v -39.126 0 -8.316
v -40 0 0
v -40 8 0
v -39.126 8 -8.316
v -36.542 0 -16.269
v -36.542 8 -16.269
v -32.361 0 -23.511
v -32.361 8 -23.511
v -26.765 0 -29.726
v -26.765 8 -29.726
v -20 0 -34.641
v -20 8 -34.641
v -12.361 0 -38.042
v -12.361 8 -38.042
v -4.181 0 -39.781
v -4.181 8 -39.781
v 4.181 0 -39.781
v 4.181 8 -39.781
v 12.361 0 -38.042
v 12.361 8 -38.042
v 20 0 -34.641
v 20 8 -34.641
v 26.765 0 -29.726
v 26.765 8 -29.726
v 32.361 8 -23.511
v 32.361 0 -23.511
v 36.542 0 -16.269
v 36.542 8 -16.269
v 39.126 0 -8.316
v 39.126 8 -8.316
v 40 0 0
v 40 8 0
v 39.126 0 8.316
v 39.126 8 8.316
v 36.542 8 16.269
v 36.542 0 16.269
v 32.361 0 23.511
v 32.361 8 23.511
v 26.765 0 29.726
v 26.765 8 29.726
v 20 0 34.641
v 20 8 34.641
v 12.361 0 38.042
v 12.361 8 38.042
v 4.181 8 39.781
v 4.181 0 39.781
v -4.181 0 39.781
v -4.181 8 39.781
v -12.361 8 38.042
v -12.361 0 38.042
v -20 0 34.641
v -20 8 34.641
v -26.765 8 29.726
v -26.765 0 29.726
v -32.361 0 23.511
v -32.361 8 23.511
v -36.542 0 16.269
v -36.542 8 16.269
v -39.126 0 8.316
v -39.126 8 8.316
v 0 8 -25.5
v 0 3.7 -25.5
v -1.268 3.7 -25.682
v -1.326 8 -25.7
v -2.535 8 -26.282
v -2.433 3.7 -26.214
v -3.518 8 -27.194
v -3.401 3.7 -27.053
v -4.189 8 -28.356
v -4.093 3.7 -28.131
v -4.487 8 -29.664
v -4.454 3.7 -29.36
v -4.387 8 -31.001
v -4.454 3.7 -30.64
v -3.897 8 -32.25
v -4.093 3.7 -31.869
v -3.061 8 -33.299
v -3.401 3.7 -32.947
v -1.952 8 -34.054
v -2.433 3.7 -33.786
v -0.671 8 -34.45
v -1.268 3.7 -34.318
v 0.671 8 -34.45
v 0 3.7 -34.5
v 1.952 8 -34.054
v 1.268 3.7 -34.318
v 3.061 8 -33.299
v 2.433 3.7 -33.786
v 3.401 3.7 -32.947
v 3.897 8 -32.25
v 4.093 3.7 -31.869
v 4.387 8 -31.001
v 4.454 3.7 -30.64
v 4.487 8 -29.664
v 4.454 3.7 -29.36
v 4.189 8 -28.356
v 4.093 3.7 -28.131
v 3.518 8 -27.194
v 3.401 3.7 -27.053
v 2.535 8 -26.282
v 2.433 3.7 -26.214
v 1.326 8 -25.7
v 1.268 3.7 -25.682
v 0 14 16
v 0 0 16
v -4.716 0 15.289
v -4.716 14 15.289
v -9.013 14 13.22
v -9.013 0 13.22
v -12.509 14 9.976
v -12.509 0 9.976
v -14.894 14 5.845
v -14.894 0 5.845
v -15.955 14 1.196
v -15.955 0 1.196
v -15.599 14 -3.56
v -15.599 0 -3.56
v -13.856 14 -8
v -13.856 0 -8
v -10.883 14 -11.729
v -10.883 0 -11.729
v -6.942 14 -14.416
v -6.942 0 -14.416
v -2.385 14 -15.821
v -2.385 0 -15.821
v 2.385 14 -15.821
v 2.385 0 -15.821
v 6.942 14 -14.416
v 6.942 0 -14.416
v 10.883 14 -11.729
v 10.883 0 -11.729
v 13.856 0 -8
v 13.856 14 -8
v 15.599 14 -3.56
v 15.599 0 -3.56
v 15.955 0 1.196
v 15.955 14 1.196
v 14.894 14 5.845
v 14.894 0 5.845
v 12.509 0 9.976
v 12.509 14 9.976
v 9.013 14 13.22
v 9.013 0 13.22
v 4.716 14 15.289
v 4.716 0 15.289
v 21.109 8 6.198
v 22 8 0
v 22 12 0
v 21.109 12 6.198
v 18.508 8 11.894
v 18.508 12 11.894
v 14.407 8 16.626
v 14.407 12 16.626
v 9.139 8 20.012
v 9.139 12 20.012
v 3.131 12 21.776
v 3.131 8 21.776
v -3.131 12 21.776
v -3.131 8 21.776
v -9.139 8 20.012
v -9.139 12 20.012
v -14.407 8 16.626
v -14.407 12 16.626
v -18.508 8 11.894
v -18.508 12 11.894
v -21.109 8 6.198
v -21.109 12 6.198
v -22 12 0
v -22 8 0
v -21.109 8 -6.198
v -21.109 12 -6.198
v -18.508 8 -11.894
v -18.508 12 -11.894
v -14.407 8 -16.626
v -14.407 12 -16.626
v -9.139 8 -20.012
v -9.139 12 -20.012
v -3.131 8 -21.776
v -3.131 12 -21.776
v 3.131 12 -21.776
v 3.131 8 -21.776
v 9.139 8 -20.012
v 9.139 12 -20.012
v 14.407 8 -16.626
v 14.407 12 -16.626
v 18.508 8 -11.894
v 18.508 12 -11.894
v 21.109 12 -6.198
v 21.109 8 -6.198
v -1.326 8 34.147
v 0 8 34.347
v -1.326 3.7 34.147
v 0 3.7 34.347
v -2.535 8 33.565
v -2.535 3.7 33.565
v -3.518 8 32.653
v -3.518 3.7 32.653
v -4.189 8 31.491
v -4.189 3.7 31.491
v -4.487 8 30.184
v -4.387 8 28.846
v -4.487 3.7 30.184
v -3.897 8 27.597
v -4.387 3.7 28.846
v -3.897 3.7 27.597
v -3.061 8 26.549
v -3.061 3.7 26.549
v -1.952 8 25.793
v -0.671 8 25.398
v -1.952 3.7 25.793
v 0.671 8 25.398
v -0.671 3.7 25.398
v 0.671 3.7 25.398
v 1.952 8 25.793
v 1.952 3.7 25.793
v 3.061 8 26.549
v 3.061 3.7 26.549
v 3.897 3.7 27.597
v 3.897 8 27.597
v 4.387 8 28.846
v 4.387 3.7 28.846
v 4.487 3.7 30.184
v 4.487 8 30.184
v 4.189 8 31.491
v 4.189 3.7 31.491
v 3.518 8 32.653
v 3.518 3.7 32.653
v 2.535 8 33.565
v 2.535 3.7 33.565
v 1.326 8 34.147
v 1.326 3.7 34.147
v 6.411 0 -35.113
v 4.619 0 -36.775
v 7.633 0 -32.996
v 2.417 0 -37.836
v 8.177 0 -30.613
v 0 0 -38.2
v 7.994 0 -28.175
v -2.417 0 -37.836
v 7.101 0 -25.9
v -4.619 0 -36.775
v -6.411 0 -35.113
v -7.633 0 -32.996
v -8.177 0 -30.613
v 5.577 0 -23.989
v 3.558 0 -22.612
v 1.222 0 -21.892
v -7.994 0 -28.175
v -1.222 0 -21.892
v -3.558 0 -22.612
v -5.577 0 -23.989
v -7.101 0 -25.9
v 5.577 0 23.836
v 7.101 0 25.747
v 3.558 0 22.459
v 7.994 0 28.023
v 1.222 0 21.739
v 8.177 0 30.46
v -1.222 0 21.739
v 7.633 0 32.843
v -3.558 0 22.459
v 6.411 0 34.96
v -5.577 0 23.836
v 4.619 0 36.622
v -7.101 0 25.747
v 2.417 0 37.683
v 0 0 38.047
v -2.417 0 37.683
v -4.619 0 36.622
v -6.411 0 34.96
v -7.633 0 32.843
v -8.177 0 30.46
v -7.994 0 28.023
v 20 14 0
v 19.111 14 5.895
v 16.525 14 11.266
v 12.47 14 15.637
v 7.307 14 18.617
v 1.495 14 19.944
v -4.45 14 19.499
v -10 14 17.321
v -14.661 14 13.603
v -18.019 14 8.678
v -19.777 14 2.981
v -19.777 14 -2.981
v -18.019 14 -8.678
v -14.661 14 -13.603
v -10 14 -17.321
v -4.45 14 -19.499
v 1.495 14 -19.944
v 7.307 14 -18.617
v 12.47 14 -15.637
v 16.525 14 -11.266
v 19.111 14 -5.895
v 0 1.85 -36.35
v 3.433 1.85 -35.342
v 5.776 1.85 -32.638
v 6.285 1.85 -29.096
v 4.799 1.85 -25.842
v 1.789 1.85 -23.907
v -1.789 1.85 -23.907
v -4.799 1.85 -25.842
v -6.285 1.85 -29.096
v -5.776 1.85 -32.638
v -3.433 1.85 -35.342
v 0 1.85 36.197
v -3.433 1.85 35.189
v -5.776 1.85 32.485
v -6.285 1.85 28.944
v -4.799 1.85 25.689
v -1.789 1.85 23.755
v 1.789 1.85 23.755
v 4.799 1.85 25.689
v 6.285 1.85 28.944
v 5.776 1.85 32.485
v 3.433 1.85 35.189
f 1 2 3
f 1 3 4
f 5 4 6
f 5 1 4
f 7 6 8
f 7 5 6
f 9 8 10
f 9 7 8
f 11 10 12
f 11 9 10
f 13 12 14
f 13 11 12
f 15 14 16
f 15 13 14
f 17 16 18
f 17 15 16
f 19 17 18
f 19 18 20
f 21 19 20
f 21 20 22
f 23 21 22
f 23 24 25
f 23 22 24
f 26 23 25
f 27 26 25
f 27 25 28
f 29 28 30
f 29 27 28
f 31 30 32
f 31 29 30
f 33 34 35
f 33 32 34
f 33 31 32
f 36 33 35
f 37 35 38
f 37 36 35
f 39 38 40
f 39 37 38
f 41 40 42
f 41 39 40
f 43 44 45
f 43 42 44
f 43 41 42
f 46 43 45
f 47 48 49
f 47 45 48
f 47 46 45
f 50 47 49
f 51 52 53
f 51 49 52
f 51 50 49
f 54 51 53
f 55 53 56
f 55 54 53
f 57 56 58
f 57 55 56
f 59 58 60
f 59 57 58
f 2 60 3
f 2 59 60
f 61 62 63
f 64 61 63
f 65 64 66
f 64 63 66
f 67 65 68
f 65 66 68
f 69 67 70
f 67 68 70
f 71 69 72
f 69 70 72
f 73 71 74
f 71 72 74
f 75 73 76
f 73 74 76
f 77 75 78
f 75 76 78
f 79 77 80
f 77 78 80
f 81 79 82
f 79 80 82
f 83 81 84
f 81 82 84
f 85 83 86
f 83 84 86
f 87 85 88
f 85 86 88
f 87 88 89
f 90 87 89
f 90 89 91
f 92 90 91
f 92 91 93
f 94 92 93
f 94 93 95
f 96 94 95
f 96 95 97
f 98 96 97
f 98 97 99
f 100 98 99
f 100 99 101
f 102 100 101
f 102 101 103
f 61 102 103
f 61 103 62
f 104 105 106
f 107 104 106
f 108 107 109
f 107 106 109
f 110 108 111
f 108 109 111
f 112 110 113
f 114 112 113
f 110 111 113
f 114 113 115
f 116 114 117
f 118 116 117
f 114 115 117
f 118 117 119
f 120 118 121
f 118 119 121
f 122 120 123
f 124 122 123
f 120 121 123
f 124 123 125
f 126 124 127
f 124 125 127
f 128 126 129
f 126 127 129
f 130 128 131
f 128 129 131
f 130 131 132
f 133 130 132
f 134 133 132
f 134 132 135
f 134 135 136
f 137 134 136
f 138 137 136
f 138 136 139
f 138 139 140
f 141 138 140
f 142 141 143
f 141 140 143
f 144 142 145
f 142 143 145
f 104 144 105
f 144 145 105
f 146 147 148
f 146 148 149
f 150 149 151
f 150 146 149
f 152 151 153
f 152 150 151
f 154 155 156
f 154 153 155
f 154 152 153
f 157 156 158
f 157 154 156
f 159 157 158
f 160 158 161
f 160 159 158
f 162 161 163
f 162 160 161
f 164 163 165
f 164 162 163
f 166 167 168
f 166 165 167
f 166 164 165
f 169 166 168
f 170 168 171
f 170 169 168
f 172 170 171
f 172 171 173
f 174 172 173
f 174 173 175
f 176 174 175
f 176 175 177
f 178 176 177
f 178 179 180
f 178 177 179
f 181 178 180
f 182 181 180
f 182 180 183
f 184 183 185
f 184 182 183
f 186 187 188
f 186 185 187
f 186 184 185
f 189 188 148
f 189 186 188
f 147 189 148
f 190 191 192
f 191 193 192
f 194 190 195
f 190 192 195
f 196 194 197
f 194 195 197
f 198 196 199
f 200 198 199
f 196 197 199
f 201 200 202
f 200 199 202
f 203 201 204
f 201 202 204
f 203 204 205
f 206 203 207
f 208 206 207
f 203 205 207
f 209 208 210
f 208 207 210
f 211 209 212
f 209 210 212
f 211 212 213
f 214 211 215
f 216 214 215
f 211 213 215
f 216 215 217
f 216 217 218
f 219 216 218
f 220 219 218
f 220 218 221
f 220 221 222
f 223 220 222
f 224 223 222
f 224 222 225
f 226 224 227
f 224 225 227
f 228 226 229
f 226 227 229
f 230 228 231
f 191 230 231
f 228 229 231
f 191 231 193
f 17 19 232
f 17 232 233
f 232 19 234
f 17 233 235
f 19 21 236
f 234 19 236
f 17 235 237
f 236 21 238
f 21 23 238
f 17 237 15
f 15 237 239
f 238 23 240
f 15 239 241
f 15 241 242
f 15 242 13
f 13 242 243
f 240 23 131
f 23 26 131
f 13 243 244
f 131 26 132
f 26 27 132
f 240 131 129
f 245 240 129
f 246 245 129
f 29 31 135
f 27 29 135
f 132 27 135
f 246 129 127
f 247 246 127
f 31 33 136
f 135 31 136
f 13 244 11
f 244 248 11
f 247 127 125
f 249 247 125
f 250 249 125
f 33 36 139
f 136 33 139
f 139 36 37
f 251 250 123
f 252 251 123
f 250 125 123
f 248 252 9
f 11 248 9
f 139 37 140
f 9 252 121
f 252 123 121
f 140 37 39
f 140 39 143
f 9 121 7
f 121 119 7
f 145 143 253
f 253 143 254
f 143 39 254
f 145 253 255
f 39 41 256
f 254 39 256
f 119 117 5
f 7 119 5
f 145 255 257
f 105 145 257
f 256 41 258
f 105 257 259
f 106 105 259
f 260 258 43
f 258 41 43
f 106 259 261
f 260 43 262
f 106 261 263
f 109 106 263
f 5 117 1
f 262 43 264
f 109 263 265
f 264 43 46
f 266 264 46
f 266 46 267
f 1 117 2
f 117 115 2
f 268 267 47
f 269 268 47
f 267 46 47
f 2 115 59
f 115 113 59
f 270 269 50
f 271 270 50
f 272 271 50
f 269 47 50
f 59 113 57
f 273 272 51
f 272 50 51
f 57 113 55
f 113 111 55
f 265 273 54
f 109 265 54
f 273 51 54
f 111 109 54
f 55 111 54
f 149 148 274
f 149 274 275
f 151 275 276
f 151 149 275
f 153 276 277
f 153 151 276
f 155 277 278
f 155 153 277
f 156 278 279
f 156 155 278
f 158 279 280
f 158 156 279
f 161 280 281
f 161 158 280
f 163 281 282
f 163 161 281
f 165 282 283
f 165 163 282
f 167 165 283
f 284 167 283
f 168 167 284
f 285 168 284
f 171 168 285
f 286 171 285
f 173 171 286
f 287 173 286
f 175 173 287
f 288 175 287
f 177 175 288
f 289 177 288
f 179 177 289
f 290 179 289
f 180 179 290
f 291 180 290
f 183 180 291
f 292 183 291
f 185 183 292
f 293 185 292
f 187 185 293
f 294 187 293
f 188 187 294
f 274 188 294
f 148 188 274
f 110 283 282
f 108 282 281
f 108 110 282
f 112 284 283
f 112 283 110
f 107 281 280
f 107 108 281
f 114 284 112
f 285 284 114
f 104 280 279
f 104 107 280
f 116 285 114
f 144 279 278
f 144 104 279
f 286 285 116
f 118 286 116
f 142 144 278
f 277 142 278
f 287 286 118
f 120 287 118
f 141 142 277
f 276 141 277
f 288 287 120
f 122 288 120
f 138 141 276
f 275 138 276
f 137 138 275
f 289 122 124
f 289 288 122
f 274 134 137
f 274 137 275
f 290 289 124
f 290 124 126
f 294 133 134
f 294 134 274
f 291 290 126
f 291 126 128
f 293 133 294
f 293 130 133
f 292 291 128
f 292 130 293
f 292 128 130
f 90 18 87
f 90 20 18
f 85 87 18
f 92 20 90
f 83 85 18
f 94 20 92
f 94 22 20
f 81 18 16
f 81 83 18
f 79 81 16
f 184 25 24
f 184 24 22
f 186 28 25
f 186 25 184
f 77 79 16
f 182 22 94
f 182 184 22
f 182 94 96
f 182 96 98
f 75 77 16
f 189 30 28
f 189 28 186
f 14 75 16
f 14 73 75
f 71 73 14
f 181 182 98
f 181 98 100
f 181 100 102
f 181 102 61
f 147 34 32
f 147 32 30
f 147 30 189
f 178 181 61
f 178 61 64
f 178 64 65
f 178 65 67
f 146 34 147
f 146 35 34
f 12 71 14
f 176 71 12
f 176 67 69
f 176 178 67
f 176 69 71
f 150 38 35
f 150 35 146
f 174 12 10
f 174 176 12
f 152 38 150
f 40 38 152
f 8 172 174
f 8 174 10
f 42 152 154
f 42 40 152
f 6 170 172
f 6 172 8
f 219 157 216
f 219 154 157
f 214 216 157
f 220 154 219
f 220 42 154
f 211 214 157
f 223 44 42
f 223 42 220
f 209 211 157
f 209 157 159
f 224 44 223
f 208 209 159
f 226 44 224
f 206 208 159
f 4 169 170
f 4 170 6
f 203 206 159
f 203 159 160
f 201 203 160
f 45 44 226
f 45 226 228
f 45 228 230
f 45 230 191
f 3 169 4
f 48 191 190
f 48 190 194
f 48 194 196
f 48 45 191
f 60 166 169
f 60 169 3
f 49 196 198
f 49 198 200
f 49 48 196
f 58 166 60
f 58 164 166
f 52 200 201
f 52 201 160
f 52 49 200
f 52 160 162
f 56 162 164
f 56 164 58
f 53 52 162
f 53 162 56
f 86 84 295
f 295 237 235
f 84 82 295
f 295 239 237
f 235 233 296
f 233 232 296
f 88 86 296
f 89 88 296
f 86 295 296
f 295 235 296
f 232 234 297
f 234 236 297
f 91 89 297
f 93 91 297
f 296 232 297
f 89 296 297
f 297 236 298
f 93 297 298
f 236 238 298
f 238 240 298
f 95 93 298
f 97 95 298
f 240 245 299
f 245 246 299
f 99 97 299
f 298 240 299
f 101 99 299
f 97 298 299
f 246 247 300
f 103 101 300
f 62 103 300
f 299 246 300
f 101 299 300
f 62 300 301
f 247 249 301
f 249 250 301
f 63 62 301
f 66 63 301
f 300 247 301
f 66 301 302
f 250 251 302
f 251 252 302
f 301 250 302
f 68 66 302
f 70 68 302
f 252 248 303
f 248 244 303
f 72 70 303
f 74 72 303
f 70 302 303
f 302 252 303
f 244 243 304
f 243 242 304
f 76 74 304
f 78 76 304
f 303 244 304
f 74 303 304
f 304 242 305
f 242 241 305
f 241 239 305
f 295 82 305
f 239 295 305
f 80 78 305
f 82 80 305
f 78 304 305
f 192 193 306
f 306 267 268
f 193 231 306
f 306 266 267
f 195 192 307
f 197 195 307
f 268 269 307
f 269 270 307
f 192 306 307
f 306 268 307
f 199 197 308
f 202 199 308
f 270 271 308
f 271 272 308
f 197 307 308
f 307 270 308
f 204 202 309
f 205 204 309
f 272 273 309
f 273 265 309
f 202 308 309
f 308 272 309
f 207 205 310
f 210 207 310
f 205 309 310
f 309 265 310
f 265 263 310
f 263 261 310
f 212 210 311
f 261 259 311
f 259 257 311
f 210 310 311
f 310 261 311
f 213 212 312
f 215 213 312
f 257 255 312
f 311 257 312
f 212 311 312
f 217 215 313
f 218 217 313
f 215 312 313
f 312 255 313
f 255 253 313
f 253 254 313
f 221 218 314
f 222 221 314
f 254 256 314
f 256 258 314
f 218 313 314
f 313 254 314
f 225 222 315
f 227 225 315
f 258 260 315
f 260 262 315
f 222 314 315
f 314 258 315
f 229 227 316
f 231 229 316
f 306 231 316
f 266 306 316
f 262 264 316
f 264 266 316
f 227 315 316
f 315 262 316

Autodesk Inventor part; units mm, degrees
ref_plane "YZ Plane" through (0, 0, 0) normal (1, 0, 0) x (0, 1, 0)
ref_plane "XZ Plane" through (0, 0, 0) normal (0, 1, 0) x (-1, 0, 0)
ref_plane "XY Plane" through (0, 0, 0) normal (0, 0, 1) x (1, 0, 0)
sketch "Эскиз1" plane through (0, 0, 0) normal (0, 1, 0) x (-1, 0, 0)
  point P0 (0, 0)
sketch "Эскиз2" plane through (0, 0, 0) normal (0, 1, 0) x (-1, 0, 0)
  circle A0 centre (0, 0) radius 40
  dimension "d0" = 80
extrude "Выдавливание1" add sketch "Эскиз2" along normal blind 8
sketch "Эскиз3" plane through (0, 0, 0) normal (0, -1, 0) x (1, 0, 0)
  circle A0 centre (0, 30) radius 8.2
  circle A1 centre (0, -30) radius 8.2
  point P0 (0, 0)
  dimension "d3" = 16.4
  dimension "d4" = 16.4
sketch "Эскиз4" plane through (0, 0, 0) normal (1, 0, 0) x (0, 1, 0)
  line L0 (0, 40) -> (0, -40) projected
  line L1 (0, 29.8473) -> (0, 38.0473)
  line L2 (0, 38.0473) -> (8.2, 29.8473)
  line L3 (8.2, 29.8473) -> (0, 29.8473)
  point P0 (0, 0)
  dimension "d5" = 8.2
  dimension "d6" = 45
revolve "Вращение1" cut sketch "Эскиз4" angle 360 about axis through (0, 8.2, 29.8473) along (0, -1, 0)
sketch "Эскиз5" plane through (0, 0, 0) normal (1, 0, 0) x (0, 1, 0)
  point P0 (0, 0)
sketch "Эскиз6" plane through (0, 0, 0) normal (1, 0, 0) x (0, 1, 0)
  line L0 (0, 40) -> (0, -40) projected
  line L1 (0, -30) -> (0, -38.2)
  line L2 (0, -38.2) -> (8.2, -30)
  line L3 (8.2, -30) -> (0, -30)
  point P0 (0, 0)
  dimension "d8" = 8.2
  dimension "d9" = 45
revolve "Вращение2" cut sketch "Эскиз6" angle 360 about axis through (0, 8.2, -30) along (0, -1, 0)
sketch "Эскиз7" plane through (0, 8, 0) normal (0, 1, 0) x (1, 0, 0)
  circle A0 centre (0, 30) radius 0.2 projected
  circle A1 centre (0, -29.8473) radius 0.2 projected
  point P0 (0, 0)
hole "Отверстие1" at (0, 8, -30) at (0, 8, 29.8473) direction (0, -1, 0) diameter 9 end through all
sketch "Эскиз8" plane through (0, 8, 0) normal (0, 1, 0) x (1, 0, 0)
  circle A0 centre (0, 0) radius 22
  dimension "d18" = 44
extrude "Выдавливание2" add sketch "Эскиз8" along normal blind 6
sketch "Эскиз9" plane through (0, 14, 0) normal (0, 1, 0) x (1, 0, 0)
  point P0 (0, 0)
  point P1 (0, 0)
hole "Отверстие2" at (0, 14, 0) direction (0, -1, 0) diameter 32 end through all
chamfer "Фаска1" distance 2 angle 45 1 edges at (-22, 14, 0)
properties part number "крышка"
